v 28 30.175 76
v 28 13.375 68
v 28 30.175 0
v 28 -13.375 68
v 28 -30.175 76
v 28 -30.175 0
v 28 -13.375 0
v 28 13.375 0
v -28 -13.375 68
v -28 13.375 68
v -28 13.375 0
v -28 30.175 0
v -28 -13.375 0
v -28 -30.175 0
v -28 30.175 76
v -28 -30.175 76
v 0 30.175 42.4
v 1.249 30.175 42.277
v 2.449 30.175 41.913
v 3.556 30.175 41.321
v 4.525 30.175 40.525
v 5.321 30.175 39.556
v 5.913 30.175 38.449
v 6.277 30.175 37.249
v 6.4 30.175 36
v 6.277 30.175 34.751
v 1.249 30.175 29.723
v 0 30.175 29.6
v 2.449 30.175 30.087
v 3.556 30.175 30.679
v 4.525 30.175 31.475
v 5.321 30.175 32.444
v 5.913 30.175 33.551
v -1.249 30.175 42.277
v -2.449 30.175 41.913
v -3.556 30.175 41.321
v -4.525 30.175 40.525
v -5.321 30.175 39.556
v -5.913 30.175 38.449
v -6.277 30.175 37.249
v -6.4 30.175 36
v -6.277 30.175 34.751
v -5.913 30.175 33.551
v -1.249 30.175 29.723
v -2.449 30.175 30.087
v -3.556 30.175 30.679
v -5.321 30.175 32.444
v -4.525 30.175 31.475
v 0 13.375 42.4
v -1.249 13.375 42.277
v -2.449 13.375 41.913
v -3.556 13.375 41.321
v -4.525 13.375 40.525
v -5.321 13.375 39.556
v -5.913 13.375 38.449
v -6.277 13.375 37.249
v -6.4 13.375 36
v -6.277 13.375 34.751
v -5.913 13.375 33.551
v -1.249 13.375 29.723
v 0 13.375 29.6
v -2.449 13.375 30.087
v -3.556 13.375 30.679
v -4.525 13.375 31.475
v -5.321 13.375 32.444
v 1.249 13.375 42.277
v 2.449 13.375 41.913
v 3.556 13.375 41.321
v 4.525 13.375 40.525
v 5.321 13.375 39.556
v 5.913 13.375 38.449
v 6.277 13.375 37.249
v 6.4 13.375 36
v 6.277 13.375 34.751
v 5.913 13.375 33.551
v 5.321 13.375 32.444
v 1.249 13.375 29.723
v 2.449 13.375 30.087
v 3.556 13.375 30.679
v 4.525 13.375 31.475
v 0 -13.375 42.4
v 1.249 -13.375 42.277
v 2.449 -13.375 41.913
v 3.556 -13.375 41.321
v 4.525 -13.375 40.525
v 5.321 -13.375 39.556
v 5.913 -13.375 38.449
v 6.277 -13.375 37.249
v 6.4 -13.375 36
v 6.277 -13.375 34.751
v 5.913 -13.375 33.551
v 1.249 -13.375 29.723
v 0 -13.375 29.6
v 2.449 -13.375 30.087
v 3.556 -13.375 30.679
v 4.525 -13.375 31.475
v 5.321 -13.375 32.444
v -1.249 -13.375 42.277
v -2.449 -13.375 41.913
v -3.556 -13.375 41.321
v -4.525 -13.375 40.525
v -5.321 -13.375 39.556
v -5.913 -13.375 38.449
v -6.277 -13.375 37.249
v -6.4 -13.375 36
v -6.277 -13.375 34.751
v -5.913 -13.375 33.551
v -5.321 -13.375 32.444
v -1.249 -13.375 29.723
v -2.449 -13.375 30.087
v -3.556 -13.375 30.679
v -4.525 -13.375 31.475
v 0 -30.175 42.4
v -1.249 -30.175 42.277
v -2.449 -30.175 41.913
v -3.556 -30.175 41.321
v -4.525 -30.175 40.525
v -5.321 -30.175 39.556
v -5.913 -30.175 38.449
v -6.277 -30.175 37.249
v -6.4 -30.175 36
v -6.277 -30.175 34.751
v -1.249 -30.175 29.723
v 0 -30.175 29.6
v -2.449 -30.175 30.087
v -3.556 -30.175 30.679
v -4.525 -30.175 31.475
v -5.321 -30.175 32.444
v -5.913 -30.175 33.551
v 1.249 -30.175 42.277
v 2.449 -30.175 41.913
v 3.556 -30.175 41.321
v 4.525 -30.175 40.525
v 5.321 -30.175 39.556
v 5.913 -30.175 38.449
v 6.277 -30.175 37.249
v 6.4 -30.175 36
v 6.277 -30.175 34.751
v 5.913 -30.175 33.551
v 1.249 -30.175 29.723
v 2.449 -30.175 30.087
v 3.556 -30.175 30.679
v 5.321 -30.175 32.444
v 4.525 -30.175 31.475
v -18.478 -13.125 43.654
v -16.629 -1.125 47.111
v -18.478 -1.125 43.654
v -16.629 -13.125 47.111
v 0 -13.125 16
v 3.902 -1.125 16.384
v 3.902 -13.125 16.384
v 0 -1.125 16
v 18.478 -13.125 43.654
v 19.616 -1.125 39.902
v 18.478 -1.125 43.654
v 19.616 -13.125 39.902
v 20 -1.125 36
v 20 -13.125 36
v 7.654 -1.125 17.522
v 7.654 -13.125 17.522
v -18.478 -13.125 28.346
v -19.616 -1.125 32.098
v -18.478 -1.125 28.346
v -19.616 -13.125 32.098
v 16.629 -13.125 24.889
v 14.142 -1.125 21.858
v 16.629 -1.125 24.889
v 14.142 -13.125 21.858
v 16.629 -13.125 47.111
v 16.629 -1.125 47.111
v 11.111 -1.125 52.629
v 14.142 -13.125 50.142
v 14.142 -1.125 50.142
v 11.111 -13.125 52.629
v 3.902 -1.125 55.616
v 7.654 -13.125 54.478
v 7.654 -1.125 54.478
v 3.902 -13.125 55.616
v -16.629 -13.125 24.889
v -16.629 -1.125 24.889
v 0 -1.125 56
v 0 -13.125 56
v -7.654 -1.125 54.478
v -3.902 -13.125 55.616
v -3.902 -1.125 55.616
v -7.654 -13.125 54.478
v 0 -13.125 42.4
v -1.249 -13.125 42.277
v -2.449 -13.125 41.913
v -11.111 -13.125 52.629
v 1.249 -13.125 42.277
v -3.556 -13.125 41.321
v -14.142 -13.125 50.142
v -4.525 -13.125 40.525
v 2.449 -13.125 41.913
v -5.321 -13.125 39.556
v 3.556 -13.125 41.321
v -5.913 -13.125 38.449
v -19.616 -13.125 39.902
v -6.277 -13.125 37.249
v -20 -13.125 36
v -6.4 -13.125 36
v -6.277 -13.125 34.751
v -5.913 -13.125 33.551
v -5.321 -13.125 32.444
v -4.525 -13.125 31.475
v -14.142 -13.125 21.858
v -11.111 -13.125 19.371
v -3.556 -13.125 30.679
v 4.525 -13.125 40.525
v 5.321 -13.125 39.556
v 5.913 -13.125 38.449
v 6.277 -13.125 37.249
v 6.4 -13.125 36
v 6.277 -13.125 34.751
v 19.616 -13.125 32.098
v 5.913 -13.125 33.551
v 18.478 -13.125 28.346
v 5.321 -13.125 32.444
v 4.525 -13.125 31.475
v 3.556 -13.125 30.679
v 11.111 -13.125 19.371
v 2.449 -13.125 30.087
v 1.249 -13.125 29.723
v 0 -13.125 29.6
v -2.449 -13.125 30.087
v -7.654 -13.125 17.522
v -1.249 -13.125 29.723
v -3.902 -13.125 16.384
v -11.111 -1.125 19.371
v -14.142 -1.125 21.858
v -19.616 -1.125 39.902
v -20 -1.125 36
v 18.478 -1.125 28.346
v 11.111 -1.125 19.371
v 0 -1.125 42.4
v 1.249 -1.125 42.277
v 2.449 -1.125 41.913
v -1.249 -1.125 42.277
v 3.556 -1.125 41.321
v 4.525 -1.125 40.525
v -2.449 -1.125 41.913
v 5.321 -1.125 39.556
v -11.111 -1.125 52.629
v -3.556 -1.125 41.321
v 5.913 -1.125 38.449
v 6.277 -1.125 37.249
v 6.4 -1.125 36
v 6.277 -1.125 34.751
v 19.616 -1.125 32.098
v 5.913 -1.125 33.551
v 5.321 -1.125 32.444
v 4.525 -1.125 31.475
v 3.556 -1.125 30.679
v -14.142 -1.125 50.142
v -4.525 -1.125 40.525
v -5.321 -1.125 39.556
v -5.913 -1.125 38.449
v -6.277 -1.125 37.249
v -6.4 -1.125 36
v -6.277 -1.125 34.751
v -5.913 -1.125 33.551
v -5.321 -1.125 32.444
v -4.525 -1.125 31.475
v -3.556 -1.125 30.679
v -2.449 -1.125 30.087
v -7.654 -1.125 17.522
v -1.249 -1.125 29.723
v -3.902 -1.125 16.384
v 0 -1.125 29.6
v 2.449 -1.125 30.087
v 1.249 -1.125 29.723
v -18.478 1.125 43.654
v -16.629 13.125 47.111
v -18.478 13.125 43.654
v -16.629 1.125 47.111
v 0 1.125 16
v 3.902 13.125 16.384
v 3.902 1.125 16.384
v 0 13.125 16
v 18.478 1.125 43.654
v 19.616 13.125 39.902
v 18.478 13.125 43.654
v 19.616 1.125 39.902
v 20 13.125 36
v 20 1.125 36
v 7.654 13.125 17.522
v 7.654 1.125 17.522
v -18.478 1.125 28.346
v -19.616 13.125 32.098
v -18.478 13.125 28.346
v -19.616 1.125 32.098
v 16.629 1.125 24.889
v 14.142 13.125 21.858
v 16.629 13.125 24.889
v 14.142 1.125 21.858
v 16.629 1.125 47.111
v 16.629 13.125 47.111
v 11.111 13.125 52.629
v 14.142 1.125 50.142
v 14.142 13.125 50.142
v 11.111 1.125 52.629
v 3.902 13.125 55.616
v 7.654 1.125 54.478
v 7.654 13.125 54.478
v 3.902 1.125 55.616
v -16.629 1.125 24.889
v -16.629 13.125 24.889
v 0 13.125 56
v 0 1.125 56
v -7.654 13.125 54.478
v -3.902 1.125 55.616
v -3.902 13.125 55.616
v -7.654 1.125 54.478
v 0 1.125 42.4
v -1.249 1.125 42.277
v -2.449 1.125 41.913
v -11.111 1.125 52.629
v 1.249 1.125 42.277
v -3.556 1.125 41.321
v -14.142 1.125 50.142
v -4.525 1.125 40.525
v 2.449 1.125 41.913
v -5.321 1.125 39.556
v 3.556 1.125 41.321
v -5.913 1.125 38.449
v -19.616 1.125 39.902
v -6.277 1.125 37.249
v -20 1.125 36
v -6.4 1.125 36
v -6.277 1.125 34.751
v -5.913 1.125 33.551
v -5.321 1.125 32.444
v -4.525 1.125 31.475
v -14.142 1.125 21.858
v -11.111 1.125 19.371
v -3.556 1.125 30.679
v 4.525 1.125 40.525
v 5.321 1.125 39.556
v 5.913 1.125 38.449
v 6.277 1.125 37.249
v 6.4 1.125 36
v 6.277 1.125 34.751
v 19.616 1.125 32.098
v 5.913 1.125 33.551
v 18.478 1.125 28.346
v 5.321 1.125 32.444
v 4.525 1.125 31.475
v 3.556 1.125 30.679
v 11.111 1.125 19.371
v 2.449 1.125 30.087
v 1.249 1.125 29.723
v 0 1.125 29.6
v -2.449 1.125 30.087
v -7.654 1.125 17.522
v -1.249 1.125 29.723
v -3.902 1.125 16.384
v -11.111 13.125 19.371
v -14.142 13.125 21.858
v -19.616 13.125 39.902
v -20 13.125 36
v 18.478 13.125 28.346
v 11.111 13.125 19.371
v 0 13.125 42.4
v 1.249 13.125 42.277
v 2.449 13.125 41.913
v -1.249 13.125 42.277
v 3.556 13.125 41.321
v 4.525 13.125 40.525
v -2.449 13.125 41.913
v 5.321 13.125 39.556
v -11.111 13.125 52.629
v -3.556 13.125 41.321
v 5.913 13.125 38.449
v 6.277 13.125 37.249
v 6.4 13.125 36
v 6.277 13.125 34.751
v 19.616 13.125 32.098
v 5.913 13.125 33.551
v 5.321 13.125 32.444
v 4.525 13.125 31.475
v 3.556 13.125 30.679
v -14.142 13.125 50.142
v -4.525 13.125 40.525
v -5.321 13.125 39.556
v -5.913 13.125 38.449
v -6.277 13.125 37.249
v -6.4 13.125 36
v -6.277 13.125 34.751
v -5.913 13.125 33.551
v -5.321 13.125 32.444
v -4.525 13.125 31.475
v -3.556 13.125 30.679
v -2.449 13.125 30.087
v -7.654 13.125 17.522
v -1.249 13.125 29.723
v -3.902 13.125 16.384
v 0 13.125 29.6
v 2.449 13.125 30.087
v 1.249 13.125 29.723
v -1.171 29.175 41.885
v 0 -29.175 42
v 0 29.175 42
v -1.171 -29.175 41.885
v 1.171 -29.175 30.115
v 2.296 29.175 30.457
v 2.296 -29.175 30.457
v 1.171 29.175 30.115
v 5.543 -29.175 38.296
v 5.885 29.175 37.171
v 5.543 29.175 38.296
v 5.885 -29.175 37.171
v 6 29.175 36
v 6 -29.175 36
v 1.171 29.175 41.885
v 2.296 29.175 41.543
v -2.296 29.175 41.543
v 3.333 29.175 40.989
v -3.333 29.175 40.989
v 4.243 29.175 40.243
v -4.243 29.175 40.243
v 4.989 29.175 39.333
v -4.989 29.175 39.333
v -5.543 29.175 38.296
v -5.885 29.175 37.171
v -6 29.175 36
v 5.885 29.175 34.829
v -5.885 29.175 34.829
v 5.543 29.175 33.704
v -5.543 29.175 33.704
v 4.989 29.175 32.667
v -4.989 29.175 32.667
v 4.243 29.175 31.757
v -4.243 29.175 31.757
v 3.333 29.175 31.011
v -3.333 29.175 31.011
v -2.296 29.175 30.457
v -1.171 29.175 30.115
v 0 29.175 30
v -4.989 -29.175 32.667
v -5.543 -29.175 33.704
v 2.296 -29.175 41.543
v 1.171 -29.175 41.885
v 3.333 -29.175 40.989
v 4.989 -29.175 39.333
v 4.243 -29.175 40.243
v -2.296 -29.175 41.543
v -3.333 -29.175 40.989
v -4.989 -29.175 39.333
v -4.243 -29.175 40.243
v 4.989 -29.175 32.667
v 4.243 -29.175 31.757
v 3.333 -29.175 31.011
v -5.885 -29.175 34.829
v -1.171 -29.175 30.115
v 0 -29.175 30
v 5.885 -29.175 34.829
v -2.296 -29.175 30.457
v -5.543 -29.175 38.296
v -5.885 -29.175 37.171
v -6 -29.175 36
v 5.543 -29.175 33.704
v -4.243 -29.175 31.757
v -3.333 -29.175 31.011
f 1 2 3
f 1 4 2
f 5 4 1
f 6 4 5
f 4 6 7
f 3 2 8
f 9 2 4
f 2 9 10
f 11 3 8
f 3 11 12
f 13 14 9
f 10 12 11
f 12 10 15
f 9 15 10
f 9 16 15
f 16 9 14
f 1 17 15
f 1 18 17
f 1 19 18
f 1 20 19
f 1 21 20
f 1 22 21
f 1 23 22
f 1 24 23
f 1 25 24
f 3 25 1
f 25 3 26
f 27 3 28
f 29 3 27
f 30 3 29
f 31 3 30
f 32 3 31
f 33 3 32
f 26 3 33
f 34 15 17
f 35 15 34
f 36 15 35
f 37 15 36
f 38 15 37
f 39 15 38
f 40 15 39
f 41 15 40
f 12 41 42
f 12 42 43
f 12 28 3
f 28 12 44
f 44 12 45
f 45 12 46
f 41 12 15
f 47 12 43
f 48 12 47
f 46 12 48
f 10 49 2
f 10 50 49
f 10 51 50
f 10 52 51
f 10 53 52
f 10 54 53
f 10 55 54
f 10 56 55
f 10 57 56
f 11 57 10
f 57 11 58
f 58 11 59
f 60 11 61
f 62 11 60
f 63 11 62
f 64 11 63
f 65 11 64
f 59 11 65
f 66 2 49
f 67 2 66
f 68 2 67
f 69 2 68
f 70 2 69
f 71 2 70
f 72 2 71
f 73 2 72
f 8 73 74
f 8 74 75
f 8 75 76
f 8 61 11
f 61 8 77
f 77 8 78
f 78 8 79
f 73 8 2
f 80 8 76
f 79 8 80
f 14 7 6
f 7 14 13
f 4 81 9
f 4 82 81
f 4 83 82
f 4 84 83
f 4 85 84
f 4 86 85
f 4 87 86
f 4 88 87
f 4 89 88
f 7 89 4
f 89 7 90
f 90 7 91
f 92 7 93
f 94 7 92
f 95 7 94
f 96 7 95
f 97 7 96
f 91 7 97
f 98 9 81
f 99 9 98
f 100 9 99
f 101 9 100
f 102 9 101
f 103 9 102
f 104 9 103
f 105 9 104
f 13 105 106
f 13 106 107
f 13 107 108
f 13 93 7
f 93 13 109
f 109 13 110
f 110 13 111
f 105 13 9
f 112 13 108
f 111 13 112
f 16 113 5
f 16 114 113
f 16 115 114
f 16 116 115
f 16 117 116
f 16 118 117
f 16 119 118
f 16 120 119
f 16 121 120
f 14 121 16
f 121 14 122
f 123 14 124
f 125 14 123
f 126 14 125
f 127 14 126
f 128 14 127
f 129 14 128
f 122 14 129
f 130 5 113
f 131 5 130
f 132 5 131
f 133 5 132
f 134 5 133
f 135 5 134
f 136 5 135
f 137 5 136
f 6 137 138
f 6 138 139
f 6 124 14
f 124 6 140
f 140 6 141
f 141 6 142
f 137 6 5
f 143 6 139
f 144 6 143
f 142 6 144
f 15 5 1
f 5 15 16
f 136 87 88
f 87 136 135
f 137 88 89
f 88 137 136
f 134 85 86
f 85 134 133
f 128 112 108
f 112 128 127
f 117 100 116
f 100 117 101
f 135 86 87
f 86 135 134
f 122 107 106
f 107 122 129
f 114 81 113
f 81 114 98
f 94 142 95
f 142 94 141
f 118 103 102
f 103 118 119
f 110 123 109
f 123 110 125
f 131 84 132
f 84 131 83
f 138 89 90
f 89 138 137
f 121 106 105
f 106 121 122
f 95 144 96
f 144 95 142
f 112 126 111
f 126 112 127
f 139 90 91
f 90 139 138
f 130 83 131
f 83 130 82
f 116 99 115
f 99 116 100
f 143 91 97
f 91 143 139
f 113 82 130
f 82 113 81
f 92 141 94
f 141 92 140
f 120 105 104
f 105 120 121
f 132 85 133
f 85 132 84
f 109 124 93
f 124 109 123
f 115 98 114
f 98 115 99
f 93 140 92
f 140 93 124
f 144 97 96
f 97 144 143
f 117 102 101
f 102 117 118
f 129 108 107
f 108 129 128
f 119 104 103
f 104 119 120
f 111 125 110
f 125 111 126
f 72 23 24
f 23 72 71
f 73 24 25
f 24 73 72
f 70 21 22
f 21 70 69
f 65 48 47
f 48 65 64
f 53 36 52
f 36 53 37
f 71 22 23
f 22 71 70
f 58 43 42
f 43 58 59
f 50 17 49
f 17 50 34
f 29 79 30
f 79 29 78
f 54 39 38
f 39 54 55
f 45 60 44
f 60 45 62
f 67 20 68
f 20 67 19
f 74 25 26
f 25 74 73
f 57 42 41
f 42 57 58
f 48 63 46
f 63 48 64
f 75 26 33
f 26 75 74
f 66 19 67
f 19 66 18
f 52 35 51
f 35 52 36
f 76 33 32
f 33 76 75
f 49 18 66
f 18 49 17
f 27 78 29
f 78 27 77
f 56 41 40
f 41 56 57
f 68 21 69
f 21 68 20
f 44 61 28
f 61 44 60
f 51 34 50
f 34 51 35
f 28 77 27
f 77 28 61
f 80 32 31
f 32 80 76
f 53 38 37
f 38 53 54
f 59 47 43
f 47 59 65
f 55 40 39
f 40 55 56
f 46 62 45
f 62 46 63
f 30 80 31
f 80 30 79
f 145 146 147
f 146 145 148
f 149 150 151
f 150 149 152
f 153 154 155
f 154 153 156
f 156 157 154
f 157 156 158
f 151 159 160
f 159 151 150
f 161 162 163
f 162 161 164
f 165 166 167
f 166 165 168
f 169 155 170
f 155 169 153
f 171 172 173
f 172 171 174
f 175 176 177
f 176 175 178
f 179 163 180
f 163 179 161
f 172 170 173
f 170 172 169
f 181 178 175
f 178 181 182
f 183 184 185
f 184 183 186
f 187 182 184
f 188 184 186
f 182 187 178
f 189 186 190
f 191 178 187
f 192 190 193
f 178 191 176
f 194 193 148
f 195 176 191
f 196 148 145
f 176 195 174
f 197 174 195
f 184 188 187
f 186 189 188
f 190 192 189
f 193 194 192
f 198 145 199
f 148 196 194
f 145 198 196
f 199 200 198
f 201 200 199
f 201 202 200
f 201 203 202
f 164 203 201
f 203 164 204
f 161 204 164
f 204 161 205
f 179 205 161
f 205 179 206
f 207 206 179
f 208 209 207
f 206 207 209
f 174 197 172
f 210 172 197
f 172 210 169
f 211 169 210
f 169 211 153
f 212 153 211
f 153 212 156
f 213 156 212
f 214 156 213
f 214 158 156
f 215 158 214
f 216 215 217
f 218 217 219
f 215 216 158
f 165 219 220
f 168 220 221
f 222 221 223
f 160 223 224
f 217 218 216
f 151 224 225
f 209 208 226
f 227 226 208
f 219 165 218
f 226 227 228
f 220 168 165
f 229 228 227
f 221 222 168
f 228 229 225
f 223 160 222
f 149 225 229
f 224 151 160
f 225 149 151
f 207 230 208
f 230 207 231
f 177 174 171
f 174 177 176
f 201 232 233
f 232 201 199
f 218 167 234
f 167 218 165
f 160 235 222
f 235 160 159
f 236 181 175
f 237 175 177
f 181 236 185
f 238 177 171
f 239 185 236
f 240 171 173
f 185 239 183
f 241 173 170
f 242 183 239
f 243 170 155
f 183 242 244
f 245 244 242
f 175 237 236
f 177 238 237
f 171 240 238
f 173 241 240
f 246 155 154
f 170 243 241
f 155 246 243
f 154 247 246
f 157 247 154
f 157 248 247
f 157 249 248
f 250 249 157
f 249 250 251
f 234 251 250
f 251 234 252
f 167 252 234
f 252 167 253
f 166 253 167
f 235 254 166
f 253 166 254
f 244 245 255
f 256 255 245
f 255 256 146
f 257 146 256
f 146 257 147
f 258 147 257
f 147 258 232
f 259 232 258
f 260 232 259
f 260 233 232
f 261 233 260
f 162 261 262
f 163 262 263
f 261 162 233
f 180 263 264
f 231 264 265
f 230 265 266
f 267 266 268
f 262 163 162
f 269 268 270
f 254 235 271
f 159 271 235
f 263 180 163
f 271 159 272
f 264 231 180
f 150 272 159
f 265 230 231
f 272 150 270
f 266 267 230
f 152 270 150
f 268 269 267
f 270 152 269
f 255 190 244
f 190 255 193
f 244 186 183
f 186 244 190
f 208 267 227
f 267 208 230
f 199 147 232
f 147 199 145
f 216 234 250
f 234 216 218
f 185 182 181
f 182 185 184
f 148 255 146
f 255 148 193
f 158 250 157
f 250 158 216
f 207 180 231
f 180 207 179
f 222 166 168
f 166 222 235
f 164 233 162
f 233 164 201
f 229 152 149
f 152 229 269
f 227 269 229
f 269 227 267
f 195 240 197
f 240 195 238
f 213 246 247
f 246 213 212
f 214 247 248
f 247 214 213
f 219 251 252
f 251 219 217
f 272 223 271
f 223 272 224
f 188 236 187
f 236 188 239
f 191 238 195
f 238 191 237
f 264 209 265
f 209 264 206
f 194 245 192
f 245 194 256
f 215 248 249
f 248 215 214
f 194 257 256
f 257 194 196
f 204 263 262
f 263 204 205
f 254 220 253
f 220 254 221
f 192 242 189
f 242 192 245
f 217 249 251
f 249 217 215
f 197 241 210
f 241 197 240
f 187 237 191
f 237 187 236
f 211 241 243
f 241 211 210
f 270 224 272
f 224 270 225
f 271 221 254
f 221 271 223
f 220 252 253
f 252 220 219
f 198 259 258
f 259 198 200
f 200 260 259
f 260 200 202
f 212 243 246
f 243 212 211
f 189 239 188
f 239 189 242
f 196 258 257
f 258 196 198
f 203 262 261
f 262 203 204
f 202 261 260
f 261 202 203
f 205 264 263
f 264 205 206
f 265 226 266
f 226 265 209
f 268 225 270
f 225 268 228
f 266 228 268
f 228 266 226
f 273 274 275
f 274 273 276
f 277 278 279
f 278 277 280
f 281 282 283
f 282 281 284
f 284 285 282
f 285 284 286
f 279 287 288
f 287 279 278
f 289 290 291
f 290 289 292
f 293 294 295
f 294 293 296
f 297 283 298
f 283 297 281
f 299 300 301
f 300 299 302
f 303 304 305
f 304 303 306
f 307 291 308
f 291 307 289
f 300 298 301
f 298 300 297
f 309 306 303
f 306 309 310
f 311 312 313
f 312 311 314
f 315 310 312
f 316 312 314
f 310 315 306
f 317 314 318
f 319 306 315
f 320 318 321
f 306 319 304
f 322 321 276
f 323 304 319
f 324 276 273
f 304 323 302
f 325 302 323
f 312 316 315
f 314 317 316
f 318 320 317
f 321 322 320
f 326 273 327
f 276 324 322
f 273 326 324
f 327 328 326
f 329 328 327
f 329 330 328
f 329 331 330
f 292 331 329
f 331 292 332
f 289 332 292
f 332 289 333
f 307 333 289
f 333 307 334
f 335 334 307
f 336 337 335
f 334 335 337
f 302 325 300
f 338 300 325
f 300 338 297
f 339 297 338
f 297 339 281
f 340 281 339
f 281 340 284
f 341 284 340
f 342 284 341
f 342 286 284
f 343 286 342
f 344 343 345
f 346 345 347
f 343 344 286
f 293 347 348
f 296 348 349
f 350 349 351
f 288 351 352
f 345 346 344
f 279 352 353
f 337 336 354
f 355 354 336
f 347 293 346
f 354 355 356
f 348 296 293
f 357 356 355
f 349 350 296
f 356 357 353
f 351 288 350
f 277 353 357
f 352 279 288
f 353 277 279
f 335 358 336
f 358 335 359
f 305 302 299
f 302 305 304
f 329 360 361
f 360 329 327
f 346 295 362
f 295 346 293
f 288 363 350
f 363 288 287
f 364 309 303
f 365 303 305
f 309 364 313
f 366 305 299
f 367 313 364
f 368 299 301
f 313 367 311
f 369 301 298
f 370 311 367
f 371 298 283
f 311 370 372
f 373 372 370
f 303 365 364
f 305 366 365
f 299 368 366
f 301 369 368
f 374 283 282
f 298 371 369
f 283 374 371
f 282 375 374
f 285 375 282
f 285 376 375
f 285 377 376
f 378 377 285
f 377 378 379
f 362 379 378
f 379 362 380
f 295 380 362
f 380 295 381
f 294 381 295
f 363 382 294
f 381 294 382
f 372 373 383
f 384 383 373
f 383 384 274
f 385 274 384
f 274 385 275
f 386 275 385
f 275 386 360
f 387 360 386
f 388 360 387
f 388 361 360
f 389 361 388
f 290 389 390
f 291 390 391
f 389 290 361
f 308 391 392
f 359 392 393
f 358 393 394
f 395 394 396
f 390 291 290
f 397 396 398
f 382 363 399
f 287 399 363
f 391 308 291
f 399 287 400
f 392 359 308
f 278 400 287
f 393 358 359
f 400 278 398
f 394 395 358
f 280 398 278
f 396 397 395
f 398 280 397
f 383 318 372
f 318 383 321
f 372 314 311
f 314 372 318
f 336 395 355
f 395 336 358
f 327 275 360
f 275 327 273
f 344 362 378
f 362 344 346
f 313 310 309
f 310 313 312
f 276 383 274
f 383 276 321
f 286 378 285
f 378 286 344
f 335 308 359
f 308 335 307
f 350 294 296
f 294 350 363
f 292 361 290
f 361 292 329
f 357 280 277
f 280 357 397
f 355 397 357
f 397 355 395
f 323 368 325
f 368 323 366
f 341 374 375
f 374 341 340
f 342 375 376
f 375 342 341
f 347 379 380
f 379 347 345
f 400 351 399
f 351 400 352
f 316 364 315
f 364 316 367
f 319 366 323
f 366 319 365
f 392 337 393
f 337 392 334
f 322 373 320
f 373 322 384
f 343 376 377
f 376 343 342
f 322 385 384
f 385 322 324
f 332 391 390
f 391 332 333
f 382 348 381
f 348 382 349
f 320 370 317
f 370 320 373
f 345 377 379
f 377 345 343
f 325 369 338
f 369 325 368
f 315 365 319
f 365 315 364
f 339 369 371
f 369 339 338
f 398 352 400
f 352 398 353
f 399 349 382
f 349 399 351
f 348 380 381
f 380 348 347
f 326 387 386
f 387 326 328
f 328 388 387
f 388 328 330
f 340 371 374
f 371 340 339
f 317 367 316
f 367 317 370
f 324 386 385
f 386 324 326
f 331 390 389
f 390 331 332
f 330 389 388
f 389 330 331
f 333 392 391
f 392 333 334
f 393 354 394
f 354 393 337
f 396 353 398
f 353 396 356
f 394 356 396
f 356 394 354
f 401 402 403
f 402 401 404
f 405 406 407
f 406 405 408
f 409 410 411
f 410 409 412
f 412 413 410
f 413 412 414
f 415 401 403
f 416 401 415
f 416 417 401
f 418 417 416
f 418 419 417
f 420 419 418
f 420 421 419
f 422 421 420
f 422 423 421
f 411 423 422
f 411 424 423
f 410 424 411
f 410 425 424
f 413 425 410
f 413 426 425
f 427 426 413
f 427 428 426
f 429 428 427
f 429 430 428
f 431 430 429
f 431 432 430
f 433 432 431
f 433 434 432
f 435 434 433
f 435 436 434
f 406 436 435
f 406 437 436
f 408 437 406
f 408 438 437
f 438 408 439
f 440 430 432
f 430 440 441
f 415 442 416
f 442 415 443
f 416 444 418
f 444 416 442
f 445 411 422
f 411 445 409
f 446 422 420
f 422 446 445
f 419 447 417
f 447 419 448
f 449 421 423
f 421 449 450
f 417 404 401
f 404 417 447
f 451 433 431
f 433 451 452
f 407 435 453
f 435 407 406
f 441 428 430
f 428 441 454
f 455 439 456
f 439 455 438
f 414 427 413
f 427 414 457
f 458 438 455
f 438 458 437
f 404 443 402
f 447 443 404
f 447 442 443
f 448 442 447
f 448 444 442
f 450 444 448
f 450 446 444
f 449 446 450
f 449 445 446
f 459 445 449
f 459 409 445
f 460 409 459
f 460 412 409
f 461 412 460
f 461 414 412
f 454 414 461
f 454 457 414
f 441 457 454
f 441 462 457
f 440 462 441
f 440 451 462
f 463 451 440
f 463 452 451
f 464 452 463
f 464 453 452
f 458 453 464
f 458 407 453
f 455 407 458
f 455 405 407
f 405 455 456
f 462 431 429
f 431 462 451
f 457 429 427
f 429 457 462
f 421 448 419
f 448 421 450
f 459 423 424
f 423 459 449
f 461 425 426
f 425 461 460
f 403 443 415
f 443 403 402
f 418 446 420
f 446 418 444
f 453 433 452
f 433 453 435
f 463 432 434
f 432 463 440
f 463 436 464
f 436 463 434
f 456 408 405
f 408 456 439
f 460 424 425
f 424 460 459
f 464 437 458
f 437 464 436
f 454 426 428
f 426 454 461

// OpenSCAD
$fn = 32;

// ------------------------------------------------------------------------
// Trolley wheel set: wheels d40, fork 68 mm tall
// Every part is its own module, assembly() places every instance.
// ------------------------------------------------------------------------

// --- part 1 ---
module trolley_fork() {
  difference() {
    union() {
      translate([-28, 13.375, 0]) cube([56, 16.8, 68]);
      translate([-28, -30.175, 0]) cube([56, 16.8, 68]);
      translate([-28, -30.175, 68]) cube([56, 60.35, 8]);
    }
    translate([0, -21.775, 36]) rotate([90, 0, 0]) cylinder(h = 18.8, d = 12.8, center = true);
    translate([0, 21.775, 36]) rotate([90, 0, 0]) cylinder(h = 18.8, d = 12.8, center = true);
  }
}

// --- part 2 ---
module trolley_wheel() {
  difference() {
      translate([0, 0, 0]) cylinder(h = 12, d = 40);
      translate([0, 0, -1]) cylinder(h = 14, d = 12.8);
    }
}

// --- part 3 ---
module trolley_axle() {
  translate([0, 0, -29.175]) cylinder(h = 58.35, d = 12);
}

// --- assembly ---
module assembly() {
  color([0.80, 0.24, 0.20]) translate([0, 0, 0]) rotate([0, 0, 0]) trolley_fork();
  color([0.20, 0.45, 0.75]) translate([0, -1.125, 36]) rotate([90, 0, 0]) trolley_wheel();
  color([0.25, 0.62, 0.32]) translate([0, 13.125, 36]) rotate([90, 0, 0]) trolley_wheel();
  color([0.92, 0.70, 0.18]) translate([0, 0, 36]) rotate([90, 0, 0]) trolley_axle();
}

assembly();
